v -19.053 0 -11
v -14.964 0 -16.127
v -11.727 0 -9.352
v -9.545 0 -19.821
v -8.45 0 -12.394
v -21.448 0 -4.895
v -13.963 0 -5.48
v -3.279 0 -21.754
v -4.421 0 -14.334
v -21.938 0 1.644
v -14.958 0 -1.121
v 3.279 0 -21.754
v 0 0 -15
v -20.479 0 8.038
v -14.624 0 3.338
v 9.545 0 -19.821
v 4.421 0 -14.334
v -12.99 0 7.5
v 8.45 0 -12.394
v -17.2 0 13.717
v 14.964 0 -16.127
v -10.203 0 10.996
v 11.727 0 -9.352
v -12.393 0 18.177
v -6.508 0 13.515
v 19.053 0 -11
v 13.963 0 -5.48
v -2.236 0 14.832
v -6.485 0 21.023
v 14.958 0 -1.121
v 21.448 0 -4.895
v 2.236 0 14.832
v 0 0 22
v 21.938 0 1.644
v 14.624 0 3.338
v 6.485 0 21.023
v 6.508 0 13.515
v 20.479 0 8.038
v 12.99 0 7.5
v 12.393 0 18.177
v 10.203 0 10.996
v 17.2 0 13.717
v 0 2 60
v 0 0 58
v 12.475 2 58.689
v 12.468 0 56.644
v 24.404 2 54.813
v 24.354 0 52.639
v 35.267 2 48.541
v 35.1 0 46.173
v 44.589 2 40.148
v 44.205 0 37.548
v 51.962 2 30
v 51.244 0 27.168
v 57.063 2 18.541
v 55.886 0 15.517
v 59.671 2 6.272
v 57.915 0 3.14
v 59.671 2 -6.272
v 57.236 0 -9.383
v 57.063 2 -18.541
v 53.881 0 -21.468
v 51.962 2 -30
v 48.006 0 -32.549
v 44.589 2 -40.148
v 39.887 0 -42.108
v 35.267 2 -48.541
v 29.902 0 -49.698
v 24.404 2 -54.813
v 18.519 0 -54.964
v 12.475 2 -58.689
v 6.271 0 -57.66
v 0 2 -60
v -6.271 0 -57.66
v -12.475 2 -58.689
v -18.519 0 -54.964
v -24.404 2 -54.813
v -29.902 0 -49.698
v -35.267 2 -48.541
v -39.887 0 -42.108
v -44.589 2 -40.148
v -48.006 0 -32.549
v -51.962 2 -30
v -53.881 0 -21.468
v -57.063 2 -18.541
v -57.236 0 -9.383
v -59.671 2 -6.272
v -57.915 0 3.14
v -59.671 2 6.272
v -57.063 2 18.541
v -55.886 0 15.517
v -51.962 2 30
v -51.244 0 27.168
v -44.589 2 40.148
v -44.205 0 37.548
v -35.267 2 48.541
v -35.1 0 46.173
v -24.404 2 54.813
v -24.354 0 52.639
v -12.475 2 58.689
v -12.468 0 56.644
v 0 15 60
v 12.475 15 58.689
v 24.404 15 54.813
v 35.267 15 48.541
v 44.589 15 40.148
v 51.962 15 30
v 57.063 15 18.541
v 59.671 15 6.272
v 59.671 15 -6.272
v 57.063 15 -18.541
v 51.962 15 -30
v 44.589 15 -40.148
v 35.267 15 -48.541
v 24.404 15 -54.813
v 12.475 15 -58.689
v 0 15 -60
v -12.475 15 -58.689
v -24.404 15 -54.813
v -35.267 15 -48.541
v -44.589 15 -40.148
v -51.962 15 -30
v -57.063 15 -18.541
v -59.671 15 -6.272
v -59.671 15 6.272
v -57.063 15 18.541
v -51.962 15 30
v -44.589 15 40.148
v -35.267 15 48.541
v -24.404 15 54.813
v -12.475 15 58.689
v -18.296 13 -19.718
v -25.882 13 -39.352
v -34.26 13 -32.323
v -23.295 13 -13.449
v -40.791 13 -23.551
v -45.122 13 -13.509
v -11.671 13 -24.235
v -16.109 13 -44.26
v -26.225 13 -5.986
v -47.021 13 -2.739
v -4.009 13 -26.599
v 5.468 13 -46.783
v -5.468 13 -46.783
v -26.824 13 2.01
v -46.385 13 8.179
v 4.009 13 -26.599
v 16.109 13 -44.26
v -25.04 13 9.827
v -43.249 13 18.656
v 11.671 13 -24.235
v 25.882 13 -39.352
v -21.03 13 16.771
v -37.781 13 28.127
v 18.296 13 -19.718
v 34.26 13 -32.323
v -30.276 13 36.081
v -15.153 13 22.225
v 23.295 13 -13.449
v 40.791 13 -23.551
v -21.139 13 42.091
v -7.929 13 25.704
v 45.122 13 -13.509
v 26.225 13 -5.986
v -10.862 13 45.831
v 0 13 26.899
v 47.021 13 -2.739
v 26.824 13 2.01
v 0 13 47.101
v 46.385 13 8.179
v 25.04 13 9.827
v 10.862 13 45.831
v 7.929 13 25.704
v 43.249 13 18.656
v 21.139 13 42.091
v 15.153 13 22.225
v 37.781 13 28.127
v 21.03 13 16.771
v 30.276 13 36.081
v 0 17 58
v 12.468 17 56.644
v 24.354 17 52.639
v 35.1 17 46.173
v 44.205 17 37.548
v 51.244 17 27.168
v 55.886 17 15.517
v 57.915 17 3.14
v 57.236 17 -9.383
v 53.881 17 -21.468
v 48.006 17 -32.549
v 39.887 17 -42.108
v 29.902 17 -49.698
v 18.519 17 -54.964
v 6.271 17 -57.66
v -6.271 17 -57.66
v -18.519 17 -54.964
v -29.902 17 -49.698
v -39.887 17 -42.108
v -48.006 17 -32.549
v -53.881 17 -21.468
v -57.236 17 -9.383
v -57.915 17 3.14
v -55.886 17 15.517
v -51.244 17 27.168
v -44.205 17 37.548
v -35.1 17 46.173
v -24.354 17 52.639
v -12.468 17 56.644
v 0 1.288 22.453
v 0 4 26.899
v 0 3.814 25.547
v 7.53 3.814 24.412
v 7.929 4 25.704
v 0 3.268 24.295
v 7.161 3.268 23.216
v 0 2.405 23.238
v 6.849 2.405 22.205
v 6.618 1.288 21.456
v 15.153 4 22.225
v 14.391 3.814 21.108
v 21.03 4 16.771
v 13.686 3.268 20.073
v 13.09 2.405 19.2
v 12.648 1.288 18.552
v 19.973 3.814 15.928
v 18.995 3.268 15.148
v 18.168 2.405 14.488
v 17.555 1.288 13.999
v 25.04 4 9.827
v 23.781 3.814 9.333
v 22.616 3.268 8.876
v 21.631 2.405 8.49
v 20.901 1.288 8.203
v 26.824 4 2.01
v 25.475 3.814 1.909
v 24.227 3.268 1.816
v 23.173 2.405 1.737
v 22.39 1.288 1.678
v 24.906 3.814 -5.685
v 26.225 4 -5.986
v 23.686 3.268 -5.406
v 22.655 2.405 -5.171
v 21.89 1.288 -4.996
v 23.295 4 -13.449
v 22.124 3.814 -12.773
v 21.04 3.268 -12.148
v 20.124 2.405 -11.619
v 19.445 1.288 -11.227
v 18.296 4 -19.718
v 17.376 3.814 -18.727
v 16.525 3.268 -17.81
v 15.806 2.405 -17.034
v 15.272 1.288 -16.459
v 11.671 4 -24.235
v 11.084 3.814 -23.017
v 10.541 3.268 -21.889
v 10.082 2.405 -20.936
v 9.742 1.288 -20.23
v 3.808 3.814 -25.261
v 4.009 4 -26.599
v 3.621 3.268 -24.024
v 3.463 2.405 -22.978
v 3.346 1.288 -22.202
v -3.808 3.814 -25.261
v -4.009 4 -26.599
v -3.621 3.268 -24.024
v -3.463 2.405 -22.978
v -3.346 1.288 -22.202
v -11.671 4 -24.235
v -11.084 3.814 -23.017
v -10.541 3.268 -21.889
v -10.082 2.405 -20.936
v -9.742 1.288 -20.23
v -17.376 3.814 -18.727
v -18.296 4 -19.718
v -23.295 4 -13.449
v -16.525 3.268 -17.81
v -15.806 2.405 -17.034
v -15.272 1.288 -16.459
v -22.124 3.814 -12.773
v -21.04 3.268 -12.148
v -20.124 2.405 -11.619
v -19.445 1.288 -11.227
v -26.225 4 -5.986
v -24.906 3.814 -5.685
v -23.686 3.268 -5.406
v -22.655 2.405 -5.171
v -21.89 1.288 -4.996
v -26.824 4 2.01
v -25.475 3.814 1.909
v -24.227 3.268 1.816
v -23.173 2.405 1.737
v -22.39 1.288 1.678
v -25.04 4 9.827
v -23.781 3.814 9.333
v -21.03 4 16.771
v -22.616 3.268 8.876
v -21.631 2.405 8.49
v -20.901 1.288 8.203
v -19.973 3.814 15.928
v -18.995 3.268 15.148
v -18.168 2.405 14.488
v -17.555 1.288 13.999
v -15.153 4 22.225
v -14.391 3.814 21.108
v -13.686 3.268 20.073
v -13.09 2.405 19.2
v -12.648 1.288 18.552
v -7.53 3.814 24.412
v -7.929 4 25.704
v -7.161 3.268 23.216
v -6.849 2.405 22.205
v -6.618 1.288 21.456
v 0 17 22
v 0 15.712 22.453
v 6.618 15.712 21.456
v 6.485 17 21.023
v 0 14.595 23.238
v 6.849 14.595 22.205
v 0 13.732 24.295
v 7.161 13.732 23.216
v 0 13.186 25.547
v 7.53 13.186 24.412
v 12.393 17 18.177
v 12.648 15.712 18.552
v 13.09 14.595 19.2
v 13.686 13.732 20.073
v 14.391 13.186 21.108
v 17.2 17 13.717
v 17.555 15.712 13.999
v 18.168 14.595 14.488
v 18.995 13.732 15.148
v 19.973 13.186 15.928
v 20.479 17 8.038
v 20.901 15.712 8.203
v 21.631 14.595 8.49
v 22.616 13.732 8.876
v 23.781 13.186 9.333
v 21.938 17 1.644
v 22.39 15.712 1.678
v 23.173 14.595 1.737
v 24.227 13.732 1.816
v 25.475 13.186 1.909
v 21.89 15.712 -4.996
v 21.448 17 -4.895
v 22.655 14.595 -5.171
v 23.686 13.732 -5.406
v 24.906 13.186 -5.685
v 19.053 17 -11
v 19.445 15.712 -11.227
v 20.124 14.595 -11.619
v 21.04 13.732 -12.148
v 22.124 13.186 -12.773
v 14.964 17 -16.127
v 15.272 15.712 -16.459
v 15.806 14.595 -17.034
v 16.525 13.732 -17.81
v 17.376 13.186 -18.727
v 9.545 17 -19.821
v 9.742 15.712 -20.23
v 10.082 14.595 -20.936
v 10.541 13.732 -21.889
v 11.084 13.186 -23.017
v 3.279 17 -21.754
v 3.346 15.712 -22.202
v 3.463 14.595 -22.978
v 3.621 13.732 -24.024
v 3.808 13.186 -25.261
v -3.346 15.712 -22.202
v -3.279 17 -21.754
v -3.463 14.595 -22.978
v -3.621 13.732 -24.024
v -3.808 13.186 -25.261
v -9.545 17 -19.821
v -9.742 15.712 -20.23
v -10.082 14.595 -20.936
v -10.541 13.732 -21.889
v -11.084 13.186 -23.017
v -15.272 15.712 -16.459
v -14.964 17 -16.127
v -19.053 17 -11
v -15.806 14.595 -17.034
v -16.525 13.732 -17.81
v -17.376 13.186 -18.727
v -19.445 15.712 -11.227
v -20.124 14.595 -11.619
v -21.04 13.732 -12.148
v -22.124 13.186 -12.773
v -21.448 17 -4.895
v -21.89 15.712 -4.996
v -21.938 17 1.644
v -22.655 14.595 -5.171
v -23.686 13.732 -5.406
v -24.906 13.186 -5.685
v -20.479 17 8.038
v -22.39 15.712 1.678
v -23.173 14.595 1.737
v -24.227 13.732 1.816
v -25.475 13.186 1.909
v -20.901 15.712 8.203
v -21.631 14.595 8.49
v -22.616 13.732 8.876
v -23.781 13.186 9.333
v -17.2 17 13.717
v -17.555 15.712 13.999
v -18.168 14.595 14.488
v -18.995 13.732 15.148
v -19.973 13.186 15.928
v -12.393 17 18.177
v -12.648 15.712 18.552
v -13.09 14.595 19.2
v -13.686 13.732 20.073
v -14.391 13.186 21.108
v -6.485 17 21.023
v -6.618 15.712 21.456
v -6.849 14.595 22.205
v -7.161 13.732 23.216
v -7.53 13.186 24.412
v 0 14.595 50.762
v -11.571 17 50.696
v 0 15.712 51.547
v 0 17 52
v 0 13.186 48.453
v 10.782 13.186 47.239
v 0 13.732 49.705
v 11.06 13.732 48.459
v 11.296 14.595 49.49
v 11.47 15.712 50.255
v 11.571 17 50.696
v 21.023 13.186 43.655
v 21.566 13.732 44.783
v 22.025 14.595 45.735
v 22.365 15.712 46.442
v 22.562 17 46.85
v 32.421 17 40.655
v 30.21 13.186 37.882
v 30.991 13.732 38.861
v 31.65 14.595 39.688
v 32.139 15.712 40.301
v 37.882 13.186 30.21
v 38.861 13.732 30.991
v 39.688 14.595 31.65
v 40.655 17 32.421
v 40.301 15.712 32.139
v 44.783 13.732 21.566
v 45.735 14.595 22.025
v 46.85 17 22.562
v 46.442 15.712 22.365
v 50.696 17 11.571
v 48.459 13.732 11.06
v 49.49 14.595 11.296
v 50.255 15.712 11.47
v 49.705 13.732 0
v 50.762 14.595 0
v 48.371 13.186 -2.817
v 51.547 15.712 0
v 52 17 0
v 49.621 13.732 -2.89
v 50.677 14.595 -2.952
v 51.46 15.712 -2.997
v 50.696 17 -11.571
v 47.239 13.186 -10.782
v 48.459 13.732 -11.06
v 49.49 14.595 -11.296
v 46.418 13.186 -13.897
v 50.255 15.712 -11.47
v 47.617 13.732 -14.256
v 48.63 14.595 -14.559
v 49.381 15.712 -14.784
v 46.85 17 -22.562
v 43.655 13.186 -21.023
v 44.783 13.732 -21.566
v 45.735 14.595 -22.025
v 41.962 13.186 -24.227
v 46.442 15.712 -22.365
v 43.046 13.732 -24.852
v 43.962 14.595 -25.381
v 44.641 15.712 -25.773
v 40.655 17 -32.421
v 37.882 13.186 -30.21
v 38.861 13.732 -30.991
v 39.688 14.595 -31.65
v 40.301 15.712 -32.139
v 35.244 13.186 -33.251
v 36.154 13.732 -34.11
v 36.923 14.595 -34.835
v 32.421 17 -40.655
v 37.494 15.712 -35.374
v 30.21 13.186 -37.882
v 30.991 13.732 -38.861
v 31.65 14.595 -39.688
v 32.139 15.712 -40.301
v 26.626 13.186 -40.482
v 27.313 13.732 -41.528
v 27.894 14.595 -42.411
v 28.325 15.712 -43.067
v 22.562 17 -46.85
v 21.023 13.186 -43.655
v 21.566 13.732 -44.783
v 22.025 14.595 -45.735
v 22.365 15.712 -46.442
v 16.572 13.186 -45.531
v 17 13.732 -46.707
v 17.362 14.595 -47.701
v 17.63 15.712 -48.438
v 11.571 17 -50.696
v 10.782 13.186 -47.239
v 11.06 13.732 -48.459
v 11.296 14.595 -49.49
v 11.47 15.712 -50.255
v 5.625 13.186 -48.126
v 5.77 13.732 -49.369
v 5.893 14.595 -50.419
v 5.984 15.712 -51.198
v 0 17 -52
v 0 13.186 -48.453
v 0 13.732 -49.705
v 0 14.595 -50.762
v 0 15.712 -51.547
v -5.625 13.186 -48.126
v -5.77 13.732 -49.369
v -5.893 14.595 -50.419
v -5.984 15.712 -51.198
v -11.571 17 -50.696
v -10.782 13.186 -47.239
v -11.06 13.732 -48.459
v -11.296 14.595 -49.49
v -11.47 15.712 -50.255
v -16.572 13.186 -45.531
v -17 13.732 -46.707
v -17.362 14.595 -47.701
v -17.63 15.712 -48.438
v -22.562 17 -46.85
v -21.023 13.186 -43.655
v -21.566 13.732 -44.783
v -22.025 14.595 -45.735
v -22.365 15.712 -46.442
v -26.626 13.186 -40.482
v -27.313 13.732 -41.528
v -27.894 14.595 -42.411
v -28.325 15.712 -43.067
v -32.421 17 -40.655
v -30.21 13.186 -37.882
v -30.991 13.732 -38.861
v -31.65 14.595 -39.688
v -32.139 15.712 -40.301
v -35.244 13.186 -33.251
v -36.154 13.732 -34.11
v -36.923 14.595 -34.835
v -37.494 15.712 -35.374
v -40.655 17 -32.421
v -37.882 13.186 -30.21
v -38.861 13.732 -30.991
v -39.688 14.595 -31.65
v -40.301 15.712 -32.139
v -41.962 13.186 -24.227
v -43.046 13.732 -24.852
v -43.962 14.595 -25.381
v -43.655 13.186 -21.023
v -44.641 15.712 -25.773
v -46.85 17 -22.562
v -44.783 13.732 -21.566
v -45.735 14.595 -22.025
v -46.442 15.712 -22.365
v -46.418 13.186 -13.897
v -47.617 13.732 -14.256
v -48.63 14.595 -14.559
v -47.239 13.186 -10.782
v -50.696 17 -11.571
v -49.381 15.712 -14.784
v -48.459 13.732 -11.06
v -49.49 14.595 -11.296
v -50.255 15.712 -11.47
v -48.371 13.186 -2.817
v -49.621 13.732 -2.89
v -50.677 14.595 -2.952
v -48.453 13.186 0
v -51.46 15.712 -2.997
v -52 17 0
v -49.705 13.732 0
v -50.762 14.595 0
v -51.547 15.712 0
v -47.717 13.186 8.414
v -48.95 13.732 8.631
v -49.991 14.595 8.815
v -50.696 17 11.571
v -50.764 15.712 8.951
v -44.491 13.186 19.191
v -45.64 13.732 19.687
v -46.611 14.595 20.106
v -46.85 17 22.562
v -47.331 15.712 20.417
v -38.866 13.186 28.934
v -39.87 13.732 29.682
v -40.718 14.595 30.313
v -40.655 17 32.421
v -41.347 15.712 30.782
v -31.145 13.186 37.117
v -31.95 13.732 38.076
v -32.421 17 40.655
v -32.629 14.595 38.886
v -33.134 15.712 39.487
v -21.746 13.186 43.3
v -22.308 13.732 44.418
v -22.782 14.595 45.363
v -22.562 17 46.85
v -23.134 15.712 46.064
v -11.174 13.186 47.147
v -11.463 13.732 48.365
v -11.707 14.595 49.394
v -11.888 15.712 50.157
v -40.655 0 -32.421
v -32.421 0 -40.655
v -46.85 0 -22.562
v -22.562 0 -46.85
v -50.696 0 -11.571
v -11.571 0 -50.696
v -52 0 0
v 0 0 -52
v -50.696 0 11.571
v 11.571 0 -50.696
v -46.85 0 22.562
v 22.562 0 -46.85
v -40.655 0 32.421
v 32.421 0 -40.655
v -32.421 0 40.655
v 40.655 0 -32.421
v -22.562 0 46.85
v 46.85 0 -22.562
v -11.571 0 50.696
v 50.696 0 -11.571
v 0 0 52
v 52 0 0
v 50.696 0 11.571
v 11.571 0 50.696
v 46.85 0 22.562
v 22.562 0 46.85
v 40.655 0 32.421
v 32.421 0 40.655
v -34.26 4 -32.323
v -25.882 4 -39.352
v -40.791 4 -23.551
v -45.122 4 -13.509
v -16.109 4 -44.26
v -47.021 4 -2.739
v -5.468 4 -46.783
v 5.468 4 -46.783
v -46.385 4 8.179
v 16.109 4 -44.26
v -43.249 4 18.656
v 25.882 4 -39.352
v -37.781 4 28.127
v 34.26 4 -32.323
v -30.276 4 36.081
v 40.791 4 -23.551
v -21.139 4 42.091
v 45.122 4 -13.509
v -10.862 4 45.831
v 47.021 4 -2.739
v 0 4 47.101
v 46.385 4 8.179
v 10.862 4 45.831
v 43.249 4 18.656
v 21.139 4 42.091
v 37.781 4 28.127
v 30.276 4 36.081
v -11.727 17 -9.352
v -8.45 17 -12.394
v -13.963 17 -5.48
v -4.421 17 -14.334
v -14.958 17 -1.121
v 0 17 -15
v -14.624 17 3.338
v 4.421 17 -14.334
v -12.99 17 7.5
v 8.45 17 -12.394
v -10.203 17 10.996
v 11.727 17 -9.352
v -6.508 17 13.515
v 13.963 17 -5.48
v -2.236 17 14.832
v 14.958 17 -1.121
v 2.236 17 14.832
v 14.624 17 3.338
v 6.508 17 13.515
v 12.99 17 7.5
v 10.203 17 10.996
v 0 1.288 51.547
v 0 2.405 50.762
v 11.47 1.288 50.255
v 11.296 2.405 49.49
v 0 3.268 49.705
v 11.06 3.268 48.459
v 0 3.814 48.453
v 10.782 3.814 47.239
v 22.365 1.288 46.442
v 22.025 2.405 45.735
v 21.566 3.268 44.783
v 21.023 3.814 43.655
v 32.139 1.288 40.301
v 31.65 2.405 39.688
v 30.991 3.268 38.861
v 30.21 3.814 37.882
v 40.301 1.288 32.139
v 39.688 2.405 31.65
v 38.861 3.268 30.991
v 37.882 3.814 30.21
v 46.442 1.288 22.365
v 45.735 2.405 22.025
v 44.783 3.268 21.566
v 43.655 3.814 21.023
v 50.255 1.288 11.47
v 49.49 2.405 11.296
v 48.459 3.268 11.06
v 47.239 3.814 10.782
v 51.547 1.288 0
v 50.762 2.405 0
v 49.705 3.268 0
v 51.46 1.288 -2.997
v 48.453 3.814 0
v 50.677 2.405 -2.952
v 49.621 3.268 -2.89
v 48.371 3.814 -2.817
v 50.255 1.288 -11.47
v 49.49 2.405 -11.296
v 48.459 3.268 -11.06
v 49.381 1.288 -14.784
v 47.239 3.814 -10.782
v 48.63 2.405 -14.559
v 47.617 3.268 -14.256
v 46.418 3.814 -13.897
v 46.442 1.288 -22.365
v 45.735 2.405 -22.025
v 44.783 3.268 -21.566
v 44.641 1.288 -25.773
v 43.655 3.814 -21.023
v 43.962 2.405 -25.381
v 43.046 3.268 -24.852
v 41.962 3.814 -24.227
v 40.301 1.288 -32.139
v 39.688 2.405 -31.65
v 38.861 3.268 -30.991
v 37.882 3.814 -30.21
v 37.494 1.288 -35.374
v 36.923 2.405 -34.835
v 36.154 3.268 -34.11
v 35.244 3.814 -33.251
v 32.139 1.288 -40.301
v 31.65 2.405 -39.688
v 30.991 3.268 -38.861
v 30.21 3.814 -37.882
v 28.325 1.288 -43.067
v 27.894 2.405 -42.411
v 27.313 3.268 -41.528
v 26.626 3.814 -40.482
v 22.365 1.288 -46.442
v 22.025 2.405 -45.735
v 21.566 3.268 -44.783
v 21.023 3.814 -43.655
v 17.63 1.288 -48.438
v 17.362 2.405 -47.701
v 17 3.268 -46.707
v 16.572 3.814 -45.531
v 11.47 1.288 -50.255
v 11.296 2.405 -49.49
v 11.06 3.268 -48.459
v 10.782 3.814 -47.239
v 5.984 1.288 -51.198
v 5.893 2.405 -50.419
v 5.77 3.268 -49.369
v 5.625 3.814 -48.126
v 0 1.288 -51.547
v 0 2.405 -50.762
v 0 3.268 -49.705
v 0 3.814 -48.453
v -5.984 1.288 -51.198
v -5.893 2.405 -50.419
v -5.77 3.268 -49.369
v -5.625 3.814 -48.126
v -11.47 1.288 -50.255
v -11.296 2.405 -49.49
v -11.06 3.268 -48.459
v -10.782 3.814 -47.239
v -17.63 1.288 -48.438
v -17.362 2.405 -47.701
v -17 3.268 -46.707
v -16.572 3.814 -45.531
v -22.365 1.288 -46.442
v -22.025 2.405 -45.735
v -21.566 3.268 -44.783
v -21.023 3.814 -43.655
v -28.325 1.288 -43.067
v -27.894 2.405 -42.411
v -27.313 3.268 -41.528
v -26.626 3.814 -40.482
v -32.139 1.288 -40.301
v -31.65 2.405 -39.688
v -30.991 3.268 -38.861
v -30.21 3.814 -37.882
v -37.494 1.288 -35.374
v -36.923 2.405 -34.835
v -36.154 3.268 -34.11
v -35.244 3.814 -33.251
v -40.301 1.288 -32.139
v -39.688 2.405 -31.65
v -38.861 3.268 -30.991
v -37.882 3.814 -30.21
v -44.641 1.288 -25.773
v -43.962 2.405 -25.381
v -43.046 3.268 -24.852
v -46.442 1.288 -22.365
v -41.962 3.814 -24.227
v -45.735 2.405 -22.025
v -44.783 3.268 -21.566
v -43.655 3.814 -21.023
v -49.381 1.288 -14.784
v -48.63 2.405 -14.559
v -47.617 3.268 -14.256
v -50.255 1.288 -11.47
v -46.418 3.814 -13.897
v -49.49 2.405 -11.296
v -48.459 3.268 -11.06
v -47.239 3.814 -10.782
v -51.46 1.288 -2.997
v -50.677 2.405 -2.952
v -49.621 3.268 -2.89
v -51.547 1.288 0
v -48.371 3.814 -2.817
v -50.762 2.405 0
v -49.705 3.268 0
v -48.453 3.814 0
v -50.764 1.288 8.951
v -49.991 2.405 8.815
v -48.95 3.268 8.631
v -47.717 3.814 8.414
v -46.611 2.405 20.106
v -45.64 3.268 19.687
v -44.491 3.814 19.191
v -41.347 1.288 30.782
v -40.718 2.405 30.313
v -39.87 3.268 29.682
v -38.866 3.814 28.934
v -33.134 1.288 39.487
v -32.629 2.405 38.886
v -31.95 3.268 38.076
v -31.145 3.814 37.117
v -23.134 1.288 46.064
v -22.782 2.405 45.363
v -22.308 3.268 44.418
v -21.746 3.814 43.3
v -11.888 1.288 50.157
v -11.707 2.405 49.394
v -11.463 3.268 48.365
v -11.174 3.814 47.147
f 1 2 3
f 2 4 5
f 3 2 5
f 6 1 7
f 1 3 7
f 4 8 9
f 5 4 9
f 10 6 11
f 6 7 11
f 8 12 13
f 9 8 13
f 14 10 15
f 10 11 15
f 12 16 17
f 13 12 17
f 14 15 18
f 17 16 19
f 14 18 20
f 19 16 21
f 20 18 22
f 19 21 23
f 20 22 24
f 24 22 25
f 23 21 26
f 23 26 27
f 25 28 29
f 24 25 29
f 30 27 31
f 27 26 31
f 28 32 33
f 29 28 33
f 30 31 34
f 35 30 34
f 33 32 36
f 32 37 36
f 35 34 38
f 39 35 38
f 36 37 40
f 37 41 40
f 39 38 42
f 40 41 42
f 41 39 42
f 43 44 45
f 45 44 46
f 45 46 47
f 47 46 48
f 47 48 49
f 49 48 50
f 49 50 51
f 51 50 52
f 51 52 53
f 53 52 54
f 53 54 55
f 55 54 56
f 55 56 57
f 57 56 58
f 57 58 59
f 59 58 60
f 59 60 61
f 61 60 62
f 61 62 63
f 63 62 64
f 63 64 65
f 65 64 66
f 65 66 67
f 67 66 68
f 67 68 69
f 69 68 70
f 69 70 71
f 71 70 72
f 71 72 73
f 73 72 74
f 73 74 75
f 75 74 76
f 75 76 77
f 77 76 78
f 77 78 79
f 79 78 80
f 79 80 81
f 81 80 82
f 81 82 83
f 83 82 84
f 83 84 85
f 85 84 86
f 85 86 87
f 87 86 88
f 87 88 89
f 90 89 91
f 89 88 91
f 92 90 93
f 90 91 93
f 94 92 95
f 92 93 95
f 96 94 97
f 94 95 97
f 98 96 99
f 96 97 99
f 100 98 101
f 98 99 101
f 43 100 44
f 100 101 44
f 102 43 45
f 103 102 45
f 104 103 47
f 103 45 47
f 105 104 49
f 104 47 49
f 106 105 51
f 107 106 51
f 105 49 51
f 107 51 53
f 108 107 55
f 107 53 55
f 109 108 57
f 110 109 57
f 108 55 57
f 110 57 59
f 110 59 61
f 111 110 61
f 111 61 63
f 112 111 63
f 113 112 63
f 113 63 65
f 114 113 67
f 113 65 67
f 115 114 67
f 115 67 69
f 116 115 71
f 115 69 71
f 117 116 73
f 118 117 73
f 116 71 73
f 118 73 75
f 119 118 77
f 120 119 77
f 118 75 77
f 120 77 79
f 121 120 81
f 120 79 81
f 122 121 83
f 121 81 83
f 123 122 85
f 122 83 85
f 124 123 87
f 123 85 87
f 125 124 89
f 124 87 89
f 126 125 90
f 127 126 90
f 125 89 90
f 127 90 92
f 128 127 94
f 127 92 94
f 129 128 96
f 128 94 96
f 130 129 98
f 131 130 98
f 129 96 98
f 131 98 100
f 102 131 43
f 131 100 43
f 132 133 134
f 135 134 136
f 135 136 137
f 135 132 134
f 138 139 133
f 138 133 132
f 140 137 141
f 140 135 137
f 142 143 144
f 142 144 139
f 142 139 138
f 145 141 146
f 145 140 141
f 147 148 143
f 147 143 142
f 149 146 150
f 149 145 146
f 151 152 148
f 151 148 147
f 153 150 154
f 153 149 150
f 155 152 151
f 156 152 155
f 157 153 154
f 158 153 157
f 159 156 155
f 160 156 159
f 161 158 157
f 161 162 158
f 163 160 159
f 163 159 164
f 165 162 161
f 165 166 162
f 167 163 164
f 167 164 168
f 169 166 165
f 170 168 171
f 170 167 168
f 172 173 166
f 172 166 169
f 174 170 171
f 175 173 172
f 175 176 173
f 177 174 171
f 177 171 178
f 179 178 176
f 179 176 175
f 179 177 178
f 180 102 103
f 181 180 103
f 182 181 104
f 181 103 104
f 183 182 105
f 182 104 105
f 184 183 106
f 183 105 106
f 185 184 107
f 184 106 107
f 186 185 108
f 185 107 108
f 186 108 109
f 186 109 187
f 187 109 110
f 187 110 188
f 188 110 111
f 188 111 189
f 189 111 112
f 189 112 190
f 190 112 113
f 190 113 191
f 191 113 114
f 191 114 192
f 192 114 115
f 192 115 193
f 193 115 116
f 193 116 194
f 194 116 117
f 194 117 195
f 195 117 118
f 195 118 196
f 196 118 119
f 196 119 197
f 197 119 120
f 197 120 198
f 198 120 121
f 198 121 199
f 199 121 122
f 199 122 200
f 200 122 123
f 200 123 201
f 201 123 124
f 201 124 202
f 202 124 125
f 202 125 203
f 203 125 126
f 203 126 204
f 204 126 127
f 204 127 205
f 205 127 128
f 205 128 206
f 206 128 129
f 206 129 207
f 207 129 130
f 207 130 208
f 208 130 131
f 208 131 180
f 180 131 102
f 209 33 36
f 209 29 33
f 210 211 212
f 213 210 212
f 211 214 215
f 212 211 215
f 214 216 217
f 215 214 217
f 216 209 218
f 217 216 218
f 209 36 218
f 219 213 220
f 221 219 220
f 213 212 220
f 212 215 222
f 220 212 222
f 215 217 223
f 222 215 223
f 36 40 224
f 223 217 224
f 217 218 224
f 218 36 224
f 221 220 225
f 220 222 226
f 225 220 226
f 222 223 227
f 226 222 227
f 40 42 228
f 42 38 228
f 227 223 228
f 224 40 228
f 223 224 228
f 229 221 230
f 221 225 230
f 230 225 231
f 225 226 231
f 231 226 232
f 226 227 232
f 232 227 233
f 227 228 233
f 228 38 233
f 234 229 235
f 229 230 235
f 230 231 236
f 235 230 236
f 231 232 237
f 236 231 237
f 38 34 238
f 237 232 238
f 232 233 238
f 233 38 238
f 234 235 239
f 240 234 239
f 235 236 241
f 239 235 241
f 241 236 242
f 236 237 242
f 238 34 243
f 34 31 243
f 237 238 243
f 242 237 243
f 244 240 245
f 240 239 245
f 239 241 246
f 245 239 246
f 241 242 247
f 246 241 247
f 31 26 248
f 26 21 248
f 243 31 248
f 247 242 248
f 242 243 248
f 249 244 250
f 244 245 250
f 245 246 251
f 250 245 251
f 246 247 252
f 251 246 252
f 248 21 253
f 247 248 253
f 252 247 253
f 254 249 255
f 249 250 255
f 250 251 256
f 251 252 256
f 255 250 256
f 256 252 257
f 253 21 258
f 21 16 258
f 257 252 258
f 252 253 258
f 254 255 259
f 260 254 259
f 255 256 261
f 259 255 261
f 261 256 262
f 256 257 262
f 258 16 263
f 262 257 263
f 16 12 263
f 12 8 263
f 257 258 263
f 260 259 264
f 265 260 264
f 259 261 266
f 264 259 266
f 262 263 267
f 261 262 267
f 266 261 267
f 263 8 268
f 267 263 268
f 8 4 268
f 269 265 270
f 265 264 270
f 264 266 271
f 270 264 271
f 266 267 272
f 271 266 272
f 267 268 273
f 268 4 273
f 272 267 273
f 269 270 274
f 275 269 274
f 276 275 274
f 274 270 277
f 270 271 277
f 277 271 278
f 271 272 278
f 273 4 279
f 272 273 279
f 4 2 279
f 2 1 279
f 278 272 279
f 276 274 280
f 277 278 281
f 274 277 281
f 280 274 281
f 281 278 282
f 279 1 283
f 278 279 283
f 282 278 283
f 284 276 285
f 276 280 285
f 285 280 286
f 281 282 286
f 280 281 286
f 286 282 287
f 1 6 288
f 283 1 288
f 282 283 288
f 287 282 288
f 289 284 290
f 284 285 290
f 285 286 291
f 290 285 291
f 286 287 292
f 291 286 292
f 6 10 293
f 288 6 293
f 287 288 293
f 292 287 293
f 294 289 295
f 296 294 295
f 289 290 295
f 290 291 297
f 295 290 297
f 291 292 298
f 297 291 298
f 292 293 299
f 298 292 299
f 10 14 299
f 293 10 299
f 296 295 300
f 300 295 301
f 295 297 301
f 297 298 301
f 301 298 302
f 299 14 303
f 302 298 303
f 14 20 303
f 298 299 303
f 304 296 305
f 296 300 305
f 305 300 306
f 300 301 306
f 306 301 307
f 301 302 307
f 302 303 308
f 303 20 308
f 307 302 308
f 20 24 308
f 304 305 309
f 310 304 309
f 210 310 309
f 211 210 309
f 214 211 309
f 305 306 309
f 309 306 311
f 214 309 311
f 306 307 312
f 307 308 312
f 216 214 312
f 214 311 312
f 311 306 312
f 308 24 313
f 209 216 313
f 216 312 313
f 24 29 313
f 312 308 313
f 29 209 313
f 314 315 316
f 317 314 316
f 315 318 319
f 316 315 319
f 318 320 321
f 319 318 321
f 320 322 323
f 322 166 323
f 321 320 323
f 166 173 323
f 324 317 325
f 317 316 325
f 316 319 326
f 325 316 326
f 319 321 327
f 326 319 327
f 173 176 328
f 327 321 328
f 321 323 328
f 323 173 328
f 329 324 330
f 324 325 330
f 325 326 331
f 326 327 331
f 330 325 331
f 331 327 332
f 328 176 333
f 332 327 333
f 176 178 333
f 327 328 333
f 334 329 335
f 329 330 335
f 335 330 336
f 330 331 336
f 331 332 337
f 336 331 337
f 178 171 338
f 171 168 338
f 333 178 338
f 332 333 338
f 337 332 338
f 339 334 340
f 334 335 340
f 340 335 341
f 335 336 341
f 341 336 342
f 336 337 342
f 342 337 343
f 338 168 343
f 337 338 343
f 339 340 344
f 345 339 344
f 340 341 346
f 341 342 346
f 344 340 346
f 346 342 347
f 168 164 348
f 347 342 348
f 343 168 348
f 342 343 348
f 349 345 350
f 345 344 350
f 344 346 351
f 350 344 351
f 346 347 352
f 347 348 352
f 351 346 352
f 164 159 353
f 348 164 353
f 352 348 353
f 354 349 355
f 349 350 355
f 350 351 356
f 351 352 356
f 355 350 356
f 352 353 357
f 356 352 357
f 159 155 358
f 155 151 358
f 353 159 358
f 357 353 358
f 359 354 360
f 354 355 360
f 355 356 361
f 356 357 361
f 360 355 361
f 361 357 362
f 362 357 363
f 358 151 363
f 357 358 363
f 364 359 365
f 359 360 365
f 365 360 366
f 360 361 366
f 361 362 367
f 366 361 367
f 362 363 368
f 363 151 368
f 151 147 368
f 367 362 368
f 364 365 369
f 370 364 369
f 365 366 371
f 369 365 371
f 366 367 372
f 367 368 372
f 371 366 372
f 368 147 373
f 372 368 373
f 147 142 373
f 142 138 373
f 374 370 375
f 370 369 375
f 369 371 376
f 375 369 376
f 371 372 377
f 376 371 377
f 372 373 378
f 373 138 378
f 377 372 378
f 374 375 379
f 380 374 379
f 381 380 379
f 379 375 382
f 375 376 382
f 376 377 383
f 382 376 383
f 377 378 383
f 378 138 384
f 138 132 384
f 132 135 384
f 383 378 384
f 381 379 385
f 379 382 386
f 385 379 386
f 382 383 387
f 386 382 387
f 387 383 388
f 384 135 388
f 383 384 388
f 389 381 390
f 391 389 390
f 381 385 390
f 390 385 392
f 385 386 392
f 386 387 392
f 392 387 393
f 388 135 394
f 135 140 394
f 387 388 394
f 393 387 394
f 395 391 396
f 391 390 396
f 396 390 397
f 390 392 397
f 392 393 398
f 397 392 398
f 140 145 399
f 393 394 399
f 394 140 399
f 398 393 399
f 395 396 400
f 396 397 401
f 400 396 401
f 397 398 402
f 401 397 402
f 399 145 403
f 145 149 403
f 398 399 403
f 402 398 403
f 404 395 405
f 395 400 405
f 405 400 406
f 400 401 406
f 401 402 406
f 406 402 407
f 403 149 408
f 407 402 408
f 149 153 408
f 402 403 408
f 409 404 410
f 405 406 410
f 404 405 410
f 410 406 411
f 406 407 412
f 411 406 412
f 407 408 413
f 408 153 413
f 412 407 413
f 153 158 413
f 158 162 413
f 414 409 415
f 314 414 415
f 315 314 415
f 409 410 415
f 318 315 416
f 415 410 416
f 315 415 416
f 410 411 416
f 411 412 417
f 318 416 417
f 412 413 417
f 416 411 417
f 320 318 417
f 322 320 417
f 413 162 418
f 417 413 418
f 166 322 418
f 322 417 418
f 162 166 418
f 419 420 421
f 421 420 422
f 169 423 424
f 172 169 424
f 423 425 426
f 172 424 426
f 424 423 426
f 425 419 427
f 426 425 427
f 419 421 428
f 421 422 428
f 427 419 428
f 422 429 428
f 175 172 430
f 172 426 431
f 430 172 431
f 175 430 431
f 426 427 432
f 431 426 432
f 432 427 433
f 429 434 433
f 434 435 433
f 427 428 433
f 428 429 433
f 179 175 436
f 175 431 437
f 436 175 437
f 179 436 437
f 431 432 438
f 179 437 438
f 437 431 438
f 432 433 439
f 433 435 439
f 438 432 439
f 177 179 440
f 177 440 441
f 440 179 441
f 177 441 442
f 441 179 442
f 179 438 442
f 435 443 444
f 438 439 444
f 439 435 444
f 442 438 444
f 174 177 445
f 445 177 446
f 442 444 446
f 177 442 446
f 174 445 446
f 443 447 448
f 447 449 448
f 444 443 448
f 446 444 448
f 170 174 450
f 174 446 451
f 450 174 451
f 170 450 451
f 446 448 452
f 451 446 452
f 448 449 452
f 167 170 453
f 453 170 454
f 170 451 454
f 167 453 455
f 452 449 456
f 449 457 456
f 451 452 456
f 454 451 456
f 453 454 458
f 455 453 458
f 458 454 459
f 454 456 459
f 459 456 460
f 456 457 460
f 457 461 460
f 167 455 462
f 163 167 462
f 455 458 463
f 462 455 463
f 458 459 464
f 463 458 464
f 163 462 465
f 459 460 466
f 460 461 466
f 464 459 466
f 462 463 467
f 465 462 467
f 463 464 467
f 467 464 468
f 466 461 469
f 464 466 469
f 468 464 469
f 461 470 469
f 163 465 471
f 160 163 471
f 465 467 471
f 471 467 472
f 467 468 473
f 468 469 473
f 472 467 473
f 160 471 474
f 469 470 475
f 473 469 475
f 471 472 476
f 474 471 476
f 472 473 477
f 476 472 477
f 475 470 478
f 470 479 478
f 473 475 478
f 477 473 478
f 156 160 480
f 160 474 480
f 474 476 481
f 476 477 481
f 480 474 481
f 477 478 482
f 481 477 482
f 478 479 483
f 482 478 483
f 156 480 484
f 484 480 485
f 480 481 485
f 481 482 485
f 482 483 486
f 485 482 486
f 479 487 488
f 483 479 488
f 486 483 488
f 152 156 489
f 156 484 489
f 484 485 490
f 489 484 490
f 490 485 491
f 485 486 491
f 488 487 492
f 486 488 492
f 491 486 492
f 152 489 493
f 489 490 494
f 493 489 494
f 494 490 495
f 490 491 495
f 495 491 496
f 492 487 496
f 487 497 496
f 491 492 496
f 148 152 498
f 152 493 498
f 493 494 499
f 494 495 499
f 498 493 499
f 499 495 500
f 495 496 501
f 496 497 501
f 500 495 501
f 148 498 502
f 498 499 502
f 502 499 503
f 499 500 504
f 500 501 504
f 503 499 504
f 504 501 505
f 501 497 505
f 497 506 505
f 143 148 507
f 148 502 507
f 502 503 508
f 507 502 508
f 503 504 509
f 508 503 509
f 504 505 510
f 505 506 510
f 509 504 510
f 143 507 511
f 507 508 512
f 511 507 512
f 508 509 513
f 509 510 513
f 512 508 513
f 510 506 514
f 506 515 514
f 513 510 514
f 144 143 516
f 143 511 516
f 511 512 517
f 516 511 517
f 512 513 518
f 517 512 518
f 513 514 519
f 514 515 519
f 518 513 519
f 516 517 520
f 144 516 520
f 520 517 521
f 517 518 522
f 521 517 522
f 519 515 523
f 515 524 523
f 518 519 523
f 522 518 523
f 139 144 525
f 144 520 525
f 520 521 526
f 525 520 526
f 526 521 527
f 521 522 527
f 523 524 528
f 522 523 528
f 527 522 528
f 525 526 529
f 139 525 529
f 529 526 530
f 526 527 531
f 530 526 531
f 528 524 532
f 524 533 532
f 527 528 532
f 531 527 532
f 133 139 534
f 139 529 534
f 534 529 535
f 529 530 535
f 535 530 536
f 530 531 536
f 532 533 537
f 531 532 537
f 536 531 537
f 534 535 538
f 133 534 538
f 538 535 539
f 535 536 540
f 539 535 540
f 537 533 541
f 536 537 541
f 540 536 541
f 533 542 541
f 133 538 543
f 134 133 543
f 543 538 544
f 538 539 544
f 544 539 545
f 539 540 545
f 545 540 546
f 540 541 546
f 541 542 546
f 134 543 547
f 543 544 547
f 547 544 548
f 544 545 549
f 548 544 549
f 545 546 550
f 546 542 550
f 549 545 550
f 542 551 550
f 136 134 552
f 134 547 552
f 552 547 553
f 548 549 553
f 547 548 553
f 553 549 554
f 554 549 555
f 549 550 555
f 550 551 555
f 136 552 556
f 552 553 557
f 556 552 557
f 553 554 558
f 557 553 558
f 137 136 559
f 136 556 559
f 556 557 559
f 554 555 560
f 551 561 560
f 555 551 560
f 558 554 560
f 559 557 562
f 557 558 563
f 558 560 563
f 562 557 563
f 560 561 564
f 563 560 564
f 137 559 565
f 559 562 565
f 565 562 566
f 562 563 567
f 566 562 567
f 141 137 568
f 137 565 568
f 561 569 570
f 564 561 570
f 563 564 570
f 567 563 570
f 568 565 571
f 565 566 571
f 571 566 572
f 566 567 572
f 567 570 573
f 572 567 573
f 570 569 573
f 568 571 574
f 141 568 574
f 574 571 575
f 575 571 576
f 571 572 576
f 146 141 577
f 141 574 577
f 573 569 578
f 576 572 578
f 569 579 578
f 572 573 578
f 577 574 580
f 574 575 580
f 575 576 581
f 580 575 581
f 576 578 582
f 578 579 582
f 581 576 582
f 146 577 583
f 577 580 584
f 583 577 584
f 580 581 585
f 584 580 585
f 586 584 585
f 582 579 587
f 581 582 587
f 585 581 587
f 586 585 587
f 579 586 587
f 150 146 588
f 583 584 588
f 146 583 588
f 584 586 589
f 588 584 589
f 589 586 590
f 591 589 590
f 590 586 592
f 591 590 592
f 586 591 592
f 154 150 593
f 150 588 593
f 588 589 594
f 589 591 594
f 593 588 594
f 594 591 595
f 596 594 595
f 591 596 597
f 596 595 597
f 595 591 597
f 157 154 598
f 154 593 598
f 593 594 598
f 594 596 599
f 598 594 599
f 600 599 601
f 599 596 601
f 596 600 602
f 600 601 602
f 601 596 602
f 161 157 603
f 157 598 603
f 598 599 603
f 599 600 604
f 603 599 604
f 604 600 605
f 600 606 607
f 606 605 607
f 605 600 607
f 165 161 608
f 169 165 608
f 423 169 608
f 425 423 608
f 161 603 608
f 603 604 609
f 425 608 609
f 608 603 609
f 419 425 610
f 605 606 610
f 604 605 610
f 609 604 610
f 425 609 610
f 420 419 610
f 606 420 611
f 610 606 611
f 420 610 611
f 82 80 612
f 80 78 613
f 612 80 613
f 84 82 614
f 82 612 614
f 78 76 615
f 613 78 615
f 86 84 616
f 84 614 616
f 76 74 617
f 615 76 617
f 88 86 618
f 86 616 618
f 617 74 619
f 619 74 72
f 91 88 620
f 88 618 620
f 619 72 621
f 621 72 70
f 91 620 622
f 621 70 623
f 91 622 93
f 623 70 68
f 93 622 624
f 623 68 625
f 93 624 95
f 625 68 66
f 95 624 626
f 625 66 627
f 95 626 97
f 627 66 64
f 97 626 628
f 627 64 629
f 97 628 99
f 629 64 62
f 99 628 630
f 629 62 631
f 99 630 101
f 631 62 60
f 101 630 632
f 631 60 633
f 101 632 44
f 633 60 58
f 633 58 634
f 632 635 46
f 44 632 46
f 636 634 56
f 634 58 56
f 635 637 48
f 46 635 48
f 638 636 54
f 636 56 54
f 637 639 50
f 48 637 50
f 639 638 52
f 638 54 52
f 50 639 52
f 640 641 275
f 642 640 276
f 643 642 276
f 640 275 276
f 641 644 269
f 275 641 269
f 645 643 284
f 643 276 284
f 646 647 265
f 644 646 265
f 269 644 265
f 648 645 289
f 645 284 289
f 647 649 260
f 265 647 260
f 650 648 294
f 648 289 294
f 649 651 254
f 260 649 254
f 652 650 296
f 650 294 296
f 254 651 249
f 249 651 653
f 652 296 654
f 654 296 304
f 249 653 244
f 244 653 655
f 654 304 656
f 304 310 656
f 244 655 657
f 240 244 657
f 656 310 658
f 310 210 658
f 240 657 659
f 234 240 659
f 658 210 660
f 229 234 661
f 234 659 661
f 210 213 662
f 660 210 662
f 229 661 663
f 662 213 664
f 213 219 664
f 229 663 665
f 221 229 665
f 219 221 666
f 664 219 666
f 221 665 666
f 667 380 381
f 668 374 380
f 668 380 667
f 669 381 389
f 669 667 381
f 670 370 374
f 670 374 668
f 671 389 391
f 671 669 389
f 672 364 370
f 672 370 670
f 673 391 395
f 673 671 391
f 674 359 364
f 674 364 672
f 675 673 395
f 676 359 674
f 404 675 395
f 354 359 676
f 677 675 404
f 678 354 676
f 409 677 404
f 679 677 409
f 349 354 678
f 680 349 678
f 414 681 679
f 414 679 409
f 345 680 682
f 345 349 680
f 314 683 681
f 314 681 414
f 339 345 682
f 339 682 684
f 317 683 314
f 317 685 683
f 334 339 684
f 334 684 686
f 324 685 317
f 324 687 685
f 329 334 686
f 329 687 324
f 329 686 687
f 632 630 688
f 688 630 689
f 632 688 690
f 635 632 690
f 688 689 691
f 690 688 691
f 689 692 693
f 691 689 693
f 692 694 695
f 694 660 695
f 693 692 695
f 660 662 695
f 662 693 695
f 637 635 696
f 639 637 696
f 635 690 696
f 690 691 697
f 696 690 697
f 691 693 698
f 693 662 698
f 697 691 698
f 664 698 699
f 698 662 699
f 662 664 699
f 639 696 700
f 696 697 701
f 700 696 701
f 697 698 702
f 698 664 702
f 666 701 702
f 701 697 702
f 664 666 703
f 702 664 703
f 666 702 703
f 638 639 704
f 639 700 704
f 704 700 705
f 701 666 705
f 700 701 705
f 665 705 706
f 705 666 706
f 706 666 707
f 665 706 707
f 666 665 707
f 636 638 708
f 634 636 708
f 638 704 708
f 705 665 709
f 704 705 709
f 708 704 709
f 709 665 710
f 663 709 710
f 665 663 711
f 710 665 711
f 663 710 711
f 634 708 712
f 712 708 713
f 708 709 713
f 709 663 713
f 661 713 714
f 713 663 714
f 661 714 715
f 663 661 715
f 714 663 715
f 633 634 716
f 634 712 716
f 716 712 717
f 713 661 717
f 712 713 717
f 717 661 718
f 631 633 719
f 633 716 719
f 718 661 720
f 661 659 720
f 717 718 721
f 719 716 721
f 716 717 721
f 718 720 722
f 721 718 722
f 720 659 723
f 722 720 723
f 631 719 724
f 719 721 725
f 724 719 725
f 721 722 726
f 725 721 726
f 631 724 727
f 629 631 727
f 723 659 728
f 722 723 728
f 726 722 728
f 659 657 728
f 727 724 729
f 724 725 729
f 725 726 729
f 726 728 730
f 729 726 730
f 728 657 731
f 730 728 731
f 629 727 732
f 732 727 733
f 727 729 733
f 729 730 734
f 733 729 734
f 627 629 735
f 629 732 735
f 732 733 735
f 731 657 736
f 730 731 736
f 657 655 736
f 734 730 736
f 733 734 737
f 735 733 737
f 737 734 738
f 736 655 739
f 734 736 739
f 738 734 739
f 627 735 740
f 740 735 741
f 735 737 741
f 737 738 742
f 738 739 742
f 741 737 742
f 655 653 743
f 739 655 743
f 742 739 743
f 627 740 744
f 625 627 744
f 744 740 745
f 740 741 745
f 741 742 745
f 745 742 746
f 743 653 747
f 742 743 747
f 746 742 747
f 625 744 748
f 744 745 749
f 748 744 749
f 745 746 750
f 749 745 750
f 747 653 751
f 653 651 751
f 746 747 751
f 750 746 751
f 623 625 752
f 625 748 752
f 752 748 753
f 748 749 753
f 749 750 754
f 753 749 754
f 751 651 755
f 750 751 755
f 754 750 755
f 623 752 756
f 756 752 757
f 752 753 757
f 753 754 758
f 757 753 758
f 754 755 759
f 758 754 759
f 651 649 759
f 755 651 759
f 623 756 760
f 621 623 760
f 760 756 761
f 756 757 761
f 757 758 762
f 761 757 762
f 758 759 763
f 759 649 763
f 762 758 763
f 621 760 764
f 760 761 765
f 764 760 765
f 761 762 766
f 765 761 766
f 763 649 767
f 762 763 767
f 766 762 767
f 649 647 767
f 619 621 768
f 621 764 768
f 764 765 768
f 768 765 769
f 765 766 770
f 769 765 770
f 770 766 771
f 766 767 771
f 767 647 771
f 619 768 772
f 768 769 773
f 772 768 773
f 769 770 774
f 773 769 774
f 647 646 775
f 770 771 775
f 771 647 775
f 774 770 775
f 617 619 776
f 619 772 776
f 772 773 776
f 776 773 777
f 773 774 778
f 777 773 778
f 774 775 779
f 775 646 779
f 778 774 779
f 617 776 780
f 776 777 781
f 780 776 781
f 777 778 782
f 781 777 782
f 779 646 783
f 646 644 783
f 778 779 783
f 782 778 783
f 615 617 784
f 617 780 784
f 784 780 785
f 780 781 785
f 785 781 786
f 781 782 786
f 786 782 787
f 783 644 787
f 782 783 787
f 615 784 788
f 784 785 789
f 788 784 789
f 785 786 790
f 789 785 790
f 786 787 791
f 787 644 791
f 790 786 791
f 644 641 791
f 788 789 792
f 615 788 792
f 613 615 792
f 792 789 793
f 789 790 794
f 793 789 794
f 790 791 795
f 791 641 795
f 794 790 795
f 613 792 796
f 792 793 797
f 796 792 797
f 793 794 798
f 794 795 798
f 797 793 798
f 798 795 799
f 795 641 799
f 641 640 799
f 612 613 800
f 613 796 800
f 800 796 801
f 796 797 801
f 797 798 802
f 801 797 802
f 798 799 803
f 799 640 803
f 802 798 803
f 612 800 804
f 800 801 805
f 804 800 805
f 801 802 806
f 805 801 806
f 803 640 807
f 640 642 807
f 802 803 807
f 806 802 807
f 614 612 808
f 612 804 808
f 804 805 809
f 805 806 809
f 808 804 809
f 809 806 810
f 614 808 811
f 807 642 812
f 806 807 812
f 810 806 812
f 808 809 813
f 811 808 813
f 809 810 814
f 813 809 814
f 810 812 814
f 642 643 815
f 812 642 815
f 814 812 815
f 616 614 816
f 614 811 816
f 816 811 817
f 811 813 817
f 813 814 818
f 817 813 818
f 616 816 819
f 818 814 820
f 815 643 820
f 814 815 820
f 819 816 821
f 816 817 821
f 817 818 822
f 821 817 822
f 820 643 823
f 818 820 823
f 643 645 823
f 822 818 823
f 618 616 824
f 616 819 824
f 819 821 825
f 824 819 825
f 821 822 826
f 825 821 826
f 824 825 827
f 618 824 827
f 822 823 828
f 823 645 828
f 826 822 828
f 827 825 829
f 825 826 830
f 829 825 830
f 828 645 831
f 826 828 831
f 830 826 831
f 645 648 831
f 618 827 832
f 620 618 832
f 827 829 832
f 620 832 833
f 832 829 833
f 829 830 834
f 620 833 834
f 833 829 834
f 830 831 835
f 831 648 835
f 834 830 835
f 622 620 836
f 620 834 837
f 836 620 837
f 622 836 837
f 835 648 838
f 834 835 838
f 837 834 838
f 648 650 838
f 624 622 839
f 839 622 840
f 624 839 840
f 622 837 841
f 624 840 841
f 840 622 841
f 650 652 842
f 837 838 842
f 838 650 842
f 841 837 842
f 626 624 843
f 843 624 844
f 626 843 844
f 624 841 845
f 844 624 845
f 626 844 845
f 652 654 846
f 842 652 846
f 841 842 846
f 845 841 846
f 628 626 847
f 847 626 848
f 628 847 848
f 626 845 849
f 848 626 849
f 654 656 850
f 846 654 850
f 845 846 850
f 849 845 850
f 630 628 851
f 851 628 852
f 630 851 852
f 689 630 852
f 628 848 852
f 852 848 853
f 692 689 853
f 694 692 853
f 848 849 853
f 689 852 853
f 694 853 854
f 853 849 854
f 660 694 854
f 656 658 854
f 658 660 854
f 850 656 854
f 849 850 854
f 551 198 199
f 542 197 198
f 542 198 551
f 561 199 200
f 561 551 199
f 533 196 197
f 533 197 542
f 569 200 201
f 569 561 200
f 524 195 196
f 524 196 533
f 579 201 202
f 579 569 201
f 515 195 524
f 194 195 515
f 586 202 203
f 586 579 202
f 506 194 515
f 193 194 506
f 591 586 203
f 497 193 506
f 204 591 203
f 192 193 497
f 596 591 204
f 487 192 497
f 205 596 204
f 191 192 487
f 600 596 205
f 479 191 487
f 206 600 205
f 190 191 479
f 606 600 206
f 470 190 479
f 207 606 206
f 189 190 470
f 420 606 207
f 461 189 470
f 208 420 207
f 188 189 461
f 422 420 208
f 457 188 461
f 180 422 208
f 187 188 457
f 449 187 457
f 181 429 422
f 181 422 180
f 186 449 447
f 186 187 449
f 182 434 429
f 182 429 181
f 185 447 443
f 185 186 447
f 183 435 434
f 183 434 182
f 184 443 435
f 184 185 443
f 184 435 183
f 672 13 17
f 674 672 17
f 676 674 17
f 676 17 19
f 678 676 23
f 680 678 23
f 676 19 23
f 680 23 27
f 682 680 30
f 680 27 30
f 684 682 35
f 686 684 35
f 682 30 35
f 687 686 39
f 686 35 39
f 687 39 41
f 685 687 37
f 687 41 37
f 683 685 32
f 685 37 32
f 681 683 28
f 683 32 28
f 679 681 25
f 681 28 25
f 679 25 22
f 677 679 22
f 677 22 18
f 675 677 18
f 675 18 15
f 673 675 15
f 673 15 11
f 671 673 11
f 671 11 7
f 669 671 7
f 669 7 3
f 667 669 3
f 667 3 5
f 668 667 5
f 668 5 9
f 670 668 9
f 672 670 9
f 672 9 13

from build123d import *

# Parameters (mm, degrees)
SKETCH1_R           = 60
BOSS_EXTRUDE1_DEPTH = 17
SKETCH2_R           = 52
SKETCH2_R_2         = 22
CUT_EXTRUDE1_DEPTH  = 4
FILLET1_R           = 5
CHAMFER1_SIZE       = 2
SKETCH3_R           = 15
CUT_EXTRUDE2_DEPTH  = 87.539008545


with BuildPart() as part:
    # Sketch1 → Boss-Extrude1 (new body)
    with BuildSketch(Plane(origin=(0, 0, 0), x_dir=(1, 0, 0), z_dir=(0, 1, 0))):
        with Locations(Location((0, 0, 0), (0, 0, 270))):
            Circle(SKETCH1_R)
    extrude(amount=BOSS_EXTRUDE1_DEPTH)

    # Sketch2 → Cut-Extrude1 (cut)
    with BuildSketch(Plane(origin=(0, 17, 0), x_dir=(1, 0, 0), z_dir=(0, 1, 0))):
        with Locations(Location((0, 0, 0), (0, 0, 270))):
            Circle(SKETCH2_R)
        with Locations(Location((0, 0, 0), (0, 0, 270))):
            Circle(SKETCH2_R_2, mode=Mode.SUBTRACT)
    cut_extrude1 = extrude(amount=-CUT_EXTRUDE1_DEPTH, mode=Mode.SUBTRACT)

    # Mirror1: Cut-Extrude1 across plane
    add(cut_extrude1.mirror(Plane.ZX.offset(8.5)), mode=Mode.SUBTRACT)

    # Fillet1
    # the kernel refuses this fillet: 5 mm, written as the material it adds along each edge
    with BuildSketch(Plane(origin=(0, 4, 0), x_dir=(0, 0, 1), z_dir=(-1, 0, 0))) as fillet1_piece_1:
        with BuildLine():
            CenterArc((47.101020514, -5), FILLET1_R, 11.536959033, 78.463040967)
            Line((47.101020514, 0), (47.101020514, 0.1))
            Line((47.101020514, 0.1), (52, 0.1))
            Line((52, 0.1), (52.1, 0))
            ThreePointArc((52.1, 0), (52.1, -2), (52.09797959, -3.98))
            Line((52.09797959, -3.98), (52, -4))
        make_face()
    revolve(axis=Axis((0, 4, 0), (0, 1, 0)))
    with BuildSketch(Plane(origin=(0, 4, 0), x_dir=(0, 0, 1), z_dir=(-1, 0, 0))) as fillet1_piece_2:
        with BuildLine():
            CenterArc((26.898979486, -5), FILLET1_R, 90, 78.463040967)
            Line((22, -4), (21.90202041, -3.98))
            ThreePointArc((21.90202041, -3.98), (21.9, -2), (21.9, 0))
            Line((21.9, 0), (22, 0.1))
            Line((22, 0.1), (26.898979486, 0.1))
            Line((26.898979486, 0.1), (26.898979486, 0))
        make_face()
    revolve(axis=Axis((0, 4, 0), (0, 1, 0)))
    with BuildSketch(Plane(origin=(0, 13, 0), x_dir=(0, 0, 1), z_dir=(-1, 0, 0))) as fillet1_piece_3:
        with BuildLine():
            CenterArc((47.101020514, 5), FILLET1_R, 270, 78.463040967)
            Line((47.101020514, 0), (47.101020514, -0.1))
            Line((47.101020514, -0.1), (52, -0.1))
            Line((52, -0.1), (52.1, 0))
            ThreePointArc((52.1, 0), (52.1, 2), (52.09797959, 3.98))
            Line((52.09797959, 3.98), (52, 4))
        make_face()
    revolve(axis=Axis((0, 13, 0), (0, 1, 0)))
    with BuildSketch(Plane(origin=(0, 13, 0), x_dir=(0, 0, 1), z_dir=(-1, 0, 0))) as fillet1_piece_4:
        with BuildLine():
            CenterArc((26.898979486, 5), FILLET1_R, 191.536959033, 78.463040967)
            Line((22, 4), (21.90202041, 3.98))
            ThreePointArc((21.90202041, 3.98), (21.9, 2), (21.9, 0))
            Line((21.9, 0), (22, -0.1))
            Line((22, -0.1), (26.898979486, -0.1))
            Line((26.898979486, -0.1), (26.898979486, 0))
        make_face()
    revolve(axis=Axis((0, 13, 0), (0, 1, 0)))

    # Chamfer1
    chamfer1_edges = [part.edges().sort_by_distance(p)[0] for p in [
        (0, 0, -60),
        (0, 17, -60),
    ]]
    chamfer(chamfer1_edges, length=CHAMFER1_SIZE)

    # Sketch3 → Cut-Extrude2 (cut, through all)
    with BuildSketch(Plane.XZ):
        with Locations(Location((0, 0, 0), (0, 0, 270))):
            Circle(SKETCH3_R)
    extrude(amount=-CUT_EXTRUDE2_DEPTH, mode=Mode.SUBTRACT)


solid = part.part
